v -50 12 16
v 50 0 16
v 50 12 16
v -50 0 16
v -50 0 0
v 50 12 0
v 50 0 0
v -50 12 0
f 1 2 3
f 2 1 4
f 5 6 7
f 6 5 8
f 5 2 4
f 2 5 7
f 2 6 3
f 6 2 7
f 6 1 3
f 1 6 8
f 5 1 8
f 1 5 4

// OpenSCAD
//
// This spacer prevents the bench from damaging the wall
//

module center_x_cube(xlen, ylen, zlen) {
    translate([(xlen/2)*-1, 0, 0])
        cube([xlen, ylen, zlen]);
}

module spacer () {
    center_x_cube(100.0, 12.0, 16.0);
}

spacer();
